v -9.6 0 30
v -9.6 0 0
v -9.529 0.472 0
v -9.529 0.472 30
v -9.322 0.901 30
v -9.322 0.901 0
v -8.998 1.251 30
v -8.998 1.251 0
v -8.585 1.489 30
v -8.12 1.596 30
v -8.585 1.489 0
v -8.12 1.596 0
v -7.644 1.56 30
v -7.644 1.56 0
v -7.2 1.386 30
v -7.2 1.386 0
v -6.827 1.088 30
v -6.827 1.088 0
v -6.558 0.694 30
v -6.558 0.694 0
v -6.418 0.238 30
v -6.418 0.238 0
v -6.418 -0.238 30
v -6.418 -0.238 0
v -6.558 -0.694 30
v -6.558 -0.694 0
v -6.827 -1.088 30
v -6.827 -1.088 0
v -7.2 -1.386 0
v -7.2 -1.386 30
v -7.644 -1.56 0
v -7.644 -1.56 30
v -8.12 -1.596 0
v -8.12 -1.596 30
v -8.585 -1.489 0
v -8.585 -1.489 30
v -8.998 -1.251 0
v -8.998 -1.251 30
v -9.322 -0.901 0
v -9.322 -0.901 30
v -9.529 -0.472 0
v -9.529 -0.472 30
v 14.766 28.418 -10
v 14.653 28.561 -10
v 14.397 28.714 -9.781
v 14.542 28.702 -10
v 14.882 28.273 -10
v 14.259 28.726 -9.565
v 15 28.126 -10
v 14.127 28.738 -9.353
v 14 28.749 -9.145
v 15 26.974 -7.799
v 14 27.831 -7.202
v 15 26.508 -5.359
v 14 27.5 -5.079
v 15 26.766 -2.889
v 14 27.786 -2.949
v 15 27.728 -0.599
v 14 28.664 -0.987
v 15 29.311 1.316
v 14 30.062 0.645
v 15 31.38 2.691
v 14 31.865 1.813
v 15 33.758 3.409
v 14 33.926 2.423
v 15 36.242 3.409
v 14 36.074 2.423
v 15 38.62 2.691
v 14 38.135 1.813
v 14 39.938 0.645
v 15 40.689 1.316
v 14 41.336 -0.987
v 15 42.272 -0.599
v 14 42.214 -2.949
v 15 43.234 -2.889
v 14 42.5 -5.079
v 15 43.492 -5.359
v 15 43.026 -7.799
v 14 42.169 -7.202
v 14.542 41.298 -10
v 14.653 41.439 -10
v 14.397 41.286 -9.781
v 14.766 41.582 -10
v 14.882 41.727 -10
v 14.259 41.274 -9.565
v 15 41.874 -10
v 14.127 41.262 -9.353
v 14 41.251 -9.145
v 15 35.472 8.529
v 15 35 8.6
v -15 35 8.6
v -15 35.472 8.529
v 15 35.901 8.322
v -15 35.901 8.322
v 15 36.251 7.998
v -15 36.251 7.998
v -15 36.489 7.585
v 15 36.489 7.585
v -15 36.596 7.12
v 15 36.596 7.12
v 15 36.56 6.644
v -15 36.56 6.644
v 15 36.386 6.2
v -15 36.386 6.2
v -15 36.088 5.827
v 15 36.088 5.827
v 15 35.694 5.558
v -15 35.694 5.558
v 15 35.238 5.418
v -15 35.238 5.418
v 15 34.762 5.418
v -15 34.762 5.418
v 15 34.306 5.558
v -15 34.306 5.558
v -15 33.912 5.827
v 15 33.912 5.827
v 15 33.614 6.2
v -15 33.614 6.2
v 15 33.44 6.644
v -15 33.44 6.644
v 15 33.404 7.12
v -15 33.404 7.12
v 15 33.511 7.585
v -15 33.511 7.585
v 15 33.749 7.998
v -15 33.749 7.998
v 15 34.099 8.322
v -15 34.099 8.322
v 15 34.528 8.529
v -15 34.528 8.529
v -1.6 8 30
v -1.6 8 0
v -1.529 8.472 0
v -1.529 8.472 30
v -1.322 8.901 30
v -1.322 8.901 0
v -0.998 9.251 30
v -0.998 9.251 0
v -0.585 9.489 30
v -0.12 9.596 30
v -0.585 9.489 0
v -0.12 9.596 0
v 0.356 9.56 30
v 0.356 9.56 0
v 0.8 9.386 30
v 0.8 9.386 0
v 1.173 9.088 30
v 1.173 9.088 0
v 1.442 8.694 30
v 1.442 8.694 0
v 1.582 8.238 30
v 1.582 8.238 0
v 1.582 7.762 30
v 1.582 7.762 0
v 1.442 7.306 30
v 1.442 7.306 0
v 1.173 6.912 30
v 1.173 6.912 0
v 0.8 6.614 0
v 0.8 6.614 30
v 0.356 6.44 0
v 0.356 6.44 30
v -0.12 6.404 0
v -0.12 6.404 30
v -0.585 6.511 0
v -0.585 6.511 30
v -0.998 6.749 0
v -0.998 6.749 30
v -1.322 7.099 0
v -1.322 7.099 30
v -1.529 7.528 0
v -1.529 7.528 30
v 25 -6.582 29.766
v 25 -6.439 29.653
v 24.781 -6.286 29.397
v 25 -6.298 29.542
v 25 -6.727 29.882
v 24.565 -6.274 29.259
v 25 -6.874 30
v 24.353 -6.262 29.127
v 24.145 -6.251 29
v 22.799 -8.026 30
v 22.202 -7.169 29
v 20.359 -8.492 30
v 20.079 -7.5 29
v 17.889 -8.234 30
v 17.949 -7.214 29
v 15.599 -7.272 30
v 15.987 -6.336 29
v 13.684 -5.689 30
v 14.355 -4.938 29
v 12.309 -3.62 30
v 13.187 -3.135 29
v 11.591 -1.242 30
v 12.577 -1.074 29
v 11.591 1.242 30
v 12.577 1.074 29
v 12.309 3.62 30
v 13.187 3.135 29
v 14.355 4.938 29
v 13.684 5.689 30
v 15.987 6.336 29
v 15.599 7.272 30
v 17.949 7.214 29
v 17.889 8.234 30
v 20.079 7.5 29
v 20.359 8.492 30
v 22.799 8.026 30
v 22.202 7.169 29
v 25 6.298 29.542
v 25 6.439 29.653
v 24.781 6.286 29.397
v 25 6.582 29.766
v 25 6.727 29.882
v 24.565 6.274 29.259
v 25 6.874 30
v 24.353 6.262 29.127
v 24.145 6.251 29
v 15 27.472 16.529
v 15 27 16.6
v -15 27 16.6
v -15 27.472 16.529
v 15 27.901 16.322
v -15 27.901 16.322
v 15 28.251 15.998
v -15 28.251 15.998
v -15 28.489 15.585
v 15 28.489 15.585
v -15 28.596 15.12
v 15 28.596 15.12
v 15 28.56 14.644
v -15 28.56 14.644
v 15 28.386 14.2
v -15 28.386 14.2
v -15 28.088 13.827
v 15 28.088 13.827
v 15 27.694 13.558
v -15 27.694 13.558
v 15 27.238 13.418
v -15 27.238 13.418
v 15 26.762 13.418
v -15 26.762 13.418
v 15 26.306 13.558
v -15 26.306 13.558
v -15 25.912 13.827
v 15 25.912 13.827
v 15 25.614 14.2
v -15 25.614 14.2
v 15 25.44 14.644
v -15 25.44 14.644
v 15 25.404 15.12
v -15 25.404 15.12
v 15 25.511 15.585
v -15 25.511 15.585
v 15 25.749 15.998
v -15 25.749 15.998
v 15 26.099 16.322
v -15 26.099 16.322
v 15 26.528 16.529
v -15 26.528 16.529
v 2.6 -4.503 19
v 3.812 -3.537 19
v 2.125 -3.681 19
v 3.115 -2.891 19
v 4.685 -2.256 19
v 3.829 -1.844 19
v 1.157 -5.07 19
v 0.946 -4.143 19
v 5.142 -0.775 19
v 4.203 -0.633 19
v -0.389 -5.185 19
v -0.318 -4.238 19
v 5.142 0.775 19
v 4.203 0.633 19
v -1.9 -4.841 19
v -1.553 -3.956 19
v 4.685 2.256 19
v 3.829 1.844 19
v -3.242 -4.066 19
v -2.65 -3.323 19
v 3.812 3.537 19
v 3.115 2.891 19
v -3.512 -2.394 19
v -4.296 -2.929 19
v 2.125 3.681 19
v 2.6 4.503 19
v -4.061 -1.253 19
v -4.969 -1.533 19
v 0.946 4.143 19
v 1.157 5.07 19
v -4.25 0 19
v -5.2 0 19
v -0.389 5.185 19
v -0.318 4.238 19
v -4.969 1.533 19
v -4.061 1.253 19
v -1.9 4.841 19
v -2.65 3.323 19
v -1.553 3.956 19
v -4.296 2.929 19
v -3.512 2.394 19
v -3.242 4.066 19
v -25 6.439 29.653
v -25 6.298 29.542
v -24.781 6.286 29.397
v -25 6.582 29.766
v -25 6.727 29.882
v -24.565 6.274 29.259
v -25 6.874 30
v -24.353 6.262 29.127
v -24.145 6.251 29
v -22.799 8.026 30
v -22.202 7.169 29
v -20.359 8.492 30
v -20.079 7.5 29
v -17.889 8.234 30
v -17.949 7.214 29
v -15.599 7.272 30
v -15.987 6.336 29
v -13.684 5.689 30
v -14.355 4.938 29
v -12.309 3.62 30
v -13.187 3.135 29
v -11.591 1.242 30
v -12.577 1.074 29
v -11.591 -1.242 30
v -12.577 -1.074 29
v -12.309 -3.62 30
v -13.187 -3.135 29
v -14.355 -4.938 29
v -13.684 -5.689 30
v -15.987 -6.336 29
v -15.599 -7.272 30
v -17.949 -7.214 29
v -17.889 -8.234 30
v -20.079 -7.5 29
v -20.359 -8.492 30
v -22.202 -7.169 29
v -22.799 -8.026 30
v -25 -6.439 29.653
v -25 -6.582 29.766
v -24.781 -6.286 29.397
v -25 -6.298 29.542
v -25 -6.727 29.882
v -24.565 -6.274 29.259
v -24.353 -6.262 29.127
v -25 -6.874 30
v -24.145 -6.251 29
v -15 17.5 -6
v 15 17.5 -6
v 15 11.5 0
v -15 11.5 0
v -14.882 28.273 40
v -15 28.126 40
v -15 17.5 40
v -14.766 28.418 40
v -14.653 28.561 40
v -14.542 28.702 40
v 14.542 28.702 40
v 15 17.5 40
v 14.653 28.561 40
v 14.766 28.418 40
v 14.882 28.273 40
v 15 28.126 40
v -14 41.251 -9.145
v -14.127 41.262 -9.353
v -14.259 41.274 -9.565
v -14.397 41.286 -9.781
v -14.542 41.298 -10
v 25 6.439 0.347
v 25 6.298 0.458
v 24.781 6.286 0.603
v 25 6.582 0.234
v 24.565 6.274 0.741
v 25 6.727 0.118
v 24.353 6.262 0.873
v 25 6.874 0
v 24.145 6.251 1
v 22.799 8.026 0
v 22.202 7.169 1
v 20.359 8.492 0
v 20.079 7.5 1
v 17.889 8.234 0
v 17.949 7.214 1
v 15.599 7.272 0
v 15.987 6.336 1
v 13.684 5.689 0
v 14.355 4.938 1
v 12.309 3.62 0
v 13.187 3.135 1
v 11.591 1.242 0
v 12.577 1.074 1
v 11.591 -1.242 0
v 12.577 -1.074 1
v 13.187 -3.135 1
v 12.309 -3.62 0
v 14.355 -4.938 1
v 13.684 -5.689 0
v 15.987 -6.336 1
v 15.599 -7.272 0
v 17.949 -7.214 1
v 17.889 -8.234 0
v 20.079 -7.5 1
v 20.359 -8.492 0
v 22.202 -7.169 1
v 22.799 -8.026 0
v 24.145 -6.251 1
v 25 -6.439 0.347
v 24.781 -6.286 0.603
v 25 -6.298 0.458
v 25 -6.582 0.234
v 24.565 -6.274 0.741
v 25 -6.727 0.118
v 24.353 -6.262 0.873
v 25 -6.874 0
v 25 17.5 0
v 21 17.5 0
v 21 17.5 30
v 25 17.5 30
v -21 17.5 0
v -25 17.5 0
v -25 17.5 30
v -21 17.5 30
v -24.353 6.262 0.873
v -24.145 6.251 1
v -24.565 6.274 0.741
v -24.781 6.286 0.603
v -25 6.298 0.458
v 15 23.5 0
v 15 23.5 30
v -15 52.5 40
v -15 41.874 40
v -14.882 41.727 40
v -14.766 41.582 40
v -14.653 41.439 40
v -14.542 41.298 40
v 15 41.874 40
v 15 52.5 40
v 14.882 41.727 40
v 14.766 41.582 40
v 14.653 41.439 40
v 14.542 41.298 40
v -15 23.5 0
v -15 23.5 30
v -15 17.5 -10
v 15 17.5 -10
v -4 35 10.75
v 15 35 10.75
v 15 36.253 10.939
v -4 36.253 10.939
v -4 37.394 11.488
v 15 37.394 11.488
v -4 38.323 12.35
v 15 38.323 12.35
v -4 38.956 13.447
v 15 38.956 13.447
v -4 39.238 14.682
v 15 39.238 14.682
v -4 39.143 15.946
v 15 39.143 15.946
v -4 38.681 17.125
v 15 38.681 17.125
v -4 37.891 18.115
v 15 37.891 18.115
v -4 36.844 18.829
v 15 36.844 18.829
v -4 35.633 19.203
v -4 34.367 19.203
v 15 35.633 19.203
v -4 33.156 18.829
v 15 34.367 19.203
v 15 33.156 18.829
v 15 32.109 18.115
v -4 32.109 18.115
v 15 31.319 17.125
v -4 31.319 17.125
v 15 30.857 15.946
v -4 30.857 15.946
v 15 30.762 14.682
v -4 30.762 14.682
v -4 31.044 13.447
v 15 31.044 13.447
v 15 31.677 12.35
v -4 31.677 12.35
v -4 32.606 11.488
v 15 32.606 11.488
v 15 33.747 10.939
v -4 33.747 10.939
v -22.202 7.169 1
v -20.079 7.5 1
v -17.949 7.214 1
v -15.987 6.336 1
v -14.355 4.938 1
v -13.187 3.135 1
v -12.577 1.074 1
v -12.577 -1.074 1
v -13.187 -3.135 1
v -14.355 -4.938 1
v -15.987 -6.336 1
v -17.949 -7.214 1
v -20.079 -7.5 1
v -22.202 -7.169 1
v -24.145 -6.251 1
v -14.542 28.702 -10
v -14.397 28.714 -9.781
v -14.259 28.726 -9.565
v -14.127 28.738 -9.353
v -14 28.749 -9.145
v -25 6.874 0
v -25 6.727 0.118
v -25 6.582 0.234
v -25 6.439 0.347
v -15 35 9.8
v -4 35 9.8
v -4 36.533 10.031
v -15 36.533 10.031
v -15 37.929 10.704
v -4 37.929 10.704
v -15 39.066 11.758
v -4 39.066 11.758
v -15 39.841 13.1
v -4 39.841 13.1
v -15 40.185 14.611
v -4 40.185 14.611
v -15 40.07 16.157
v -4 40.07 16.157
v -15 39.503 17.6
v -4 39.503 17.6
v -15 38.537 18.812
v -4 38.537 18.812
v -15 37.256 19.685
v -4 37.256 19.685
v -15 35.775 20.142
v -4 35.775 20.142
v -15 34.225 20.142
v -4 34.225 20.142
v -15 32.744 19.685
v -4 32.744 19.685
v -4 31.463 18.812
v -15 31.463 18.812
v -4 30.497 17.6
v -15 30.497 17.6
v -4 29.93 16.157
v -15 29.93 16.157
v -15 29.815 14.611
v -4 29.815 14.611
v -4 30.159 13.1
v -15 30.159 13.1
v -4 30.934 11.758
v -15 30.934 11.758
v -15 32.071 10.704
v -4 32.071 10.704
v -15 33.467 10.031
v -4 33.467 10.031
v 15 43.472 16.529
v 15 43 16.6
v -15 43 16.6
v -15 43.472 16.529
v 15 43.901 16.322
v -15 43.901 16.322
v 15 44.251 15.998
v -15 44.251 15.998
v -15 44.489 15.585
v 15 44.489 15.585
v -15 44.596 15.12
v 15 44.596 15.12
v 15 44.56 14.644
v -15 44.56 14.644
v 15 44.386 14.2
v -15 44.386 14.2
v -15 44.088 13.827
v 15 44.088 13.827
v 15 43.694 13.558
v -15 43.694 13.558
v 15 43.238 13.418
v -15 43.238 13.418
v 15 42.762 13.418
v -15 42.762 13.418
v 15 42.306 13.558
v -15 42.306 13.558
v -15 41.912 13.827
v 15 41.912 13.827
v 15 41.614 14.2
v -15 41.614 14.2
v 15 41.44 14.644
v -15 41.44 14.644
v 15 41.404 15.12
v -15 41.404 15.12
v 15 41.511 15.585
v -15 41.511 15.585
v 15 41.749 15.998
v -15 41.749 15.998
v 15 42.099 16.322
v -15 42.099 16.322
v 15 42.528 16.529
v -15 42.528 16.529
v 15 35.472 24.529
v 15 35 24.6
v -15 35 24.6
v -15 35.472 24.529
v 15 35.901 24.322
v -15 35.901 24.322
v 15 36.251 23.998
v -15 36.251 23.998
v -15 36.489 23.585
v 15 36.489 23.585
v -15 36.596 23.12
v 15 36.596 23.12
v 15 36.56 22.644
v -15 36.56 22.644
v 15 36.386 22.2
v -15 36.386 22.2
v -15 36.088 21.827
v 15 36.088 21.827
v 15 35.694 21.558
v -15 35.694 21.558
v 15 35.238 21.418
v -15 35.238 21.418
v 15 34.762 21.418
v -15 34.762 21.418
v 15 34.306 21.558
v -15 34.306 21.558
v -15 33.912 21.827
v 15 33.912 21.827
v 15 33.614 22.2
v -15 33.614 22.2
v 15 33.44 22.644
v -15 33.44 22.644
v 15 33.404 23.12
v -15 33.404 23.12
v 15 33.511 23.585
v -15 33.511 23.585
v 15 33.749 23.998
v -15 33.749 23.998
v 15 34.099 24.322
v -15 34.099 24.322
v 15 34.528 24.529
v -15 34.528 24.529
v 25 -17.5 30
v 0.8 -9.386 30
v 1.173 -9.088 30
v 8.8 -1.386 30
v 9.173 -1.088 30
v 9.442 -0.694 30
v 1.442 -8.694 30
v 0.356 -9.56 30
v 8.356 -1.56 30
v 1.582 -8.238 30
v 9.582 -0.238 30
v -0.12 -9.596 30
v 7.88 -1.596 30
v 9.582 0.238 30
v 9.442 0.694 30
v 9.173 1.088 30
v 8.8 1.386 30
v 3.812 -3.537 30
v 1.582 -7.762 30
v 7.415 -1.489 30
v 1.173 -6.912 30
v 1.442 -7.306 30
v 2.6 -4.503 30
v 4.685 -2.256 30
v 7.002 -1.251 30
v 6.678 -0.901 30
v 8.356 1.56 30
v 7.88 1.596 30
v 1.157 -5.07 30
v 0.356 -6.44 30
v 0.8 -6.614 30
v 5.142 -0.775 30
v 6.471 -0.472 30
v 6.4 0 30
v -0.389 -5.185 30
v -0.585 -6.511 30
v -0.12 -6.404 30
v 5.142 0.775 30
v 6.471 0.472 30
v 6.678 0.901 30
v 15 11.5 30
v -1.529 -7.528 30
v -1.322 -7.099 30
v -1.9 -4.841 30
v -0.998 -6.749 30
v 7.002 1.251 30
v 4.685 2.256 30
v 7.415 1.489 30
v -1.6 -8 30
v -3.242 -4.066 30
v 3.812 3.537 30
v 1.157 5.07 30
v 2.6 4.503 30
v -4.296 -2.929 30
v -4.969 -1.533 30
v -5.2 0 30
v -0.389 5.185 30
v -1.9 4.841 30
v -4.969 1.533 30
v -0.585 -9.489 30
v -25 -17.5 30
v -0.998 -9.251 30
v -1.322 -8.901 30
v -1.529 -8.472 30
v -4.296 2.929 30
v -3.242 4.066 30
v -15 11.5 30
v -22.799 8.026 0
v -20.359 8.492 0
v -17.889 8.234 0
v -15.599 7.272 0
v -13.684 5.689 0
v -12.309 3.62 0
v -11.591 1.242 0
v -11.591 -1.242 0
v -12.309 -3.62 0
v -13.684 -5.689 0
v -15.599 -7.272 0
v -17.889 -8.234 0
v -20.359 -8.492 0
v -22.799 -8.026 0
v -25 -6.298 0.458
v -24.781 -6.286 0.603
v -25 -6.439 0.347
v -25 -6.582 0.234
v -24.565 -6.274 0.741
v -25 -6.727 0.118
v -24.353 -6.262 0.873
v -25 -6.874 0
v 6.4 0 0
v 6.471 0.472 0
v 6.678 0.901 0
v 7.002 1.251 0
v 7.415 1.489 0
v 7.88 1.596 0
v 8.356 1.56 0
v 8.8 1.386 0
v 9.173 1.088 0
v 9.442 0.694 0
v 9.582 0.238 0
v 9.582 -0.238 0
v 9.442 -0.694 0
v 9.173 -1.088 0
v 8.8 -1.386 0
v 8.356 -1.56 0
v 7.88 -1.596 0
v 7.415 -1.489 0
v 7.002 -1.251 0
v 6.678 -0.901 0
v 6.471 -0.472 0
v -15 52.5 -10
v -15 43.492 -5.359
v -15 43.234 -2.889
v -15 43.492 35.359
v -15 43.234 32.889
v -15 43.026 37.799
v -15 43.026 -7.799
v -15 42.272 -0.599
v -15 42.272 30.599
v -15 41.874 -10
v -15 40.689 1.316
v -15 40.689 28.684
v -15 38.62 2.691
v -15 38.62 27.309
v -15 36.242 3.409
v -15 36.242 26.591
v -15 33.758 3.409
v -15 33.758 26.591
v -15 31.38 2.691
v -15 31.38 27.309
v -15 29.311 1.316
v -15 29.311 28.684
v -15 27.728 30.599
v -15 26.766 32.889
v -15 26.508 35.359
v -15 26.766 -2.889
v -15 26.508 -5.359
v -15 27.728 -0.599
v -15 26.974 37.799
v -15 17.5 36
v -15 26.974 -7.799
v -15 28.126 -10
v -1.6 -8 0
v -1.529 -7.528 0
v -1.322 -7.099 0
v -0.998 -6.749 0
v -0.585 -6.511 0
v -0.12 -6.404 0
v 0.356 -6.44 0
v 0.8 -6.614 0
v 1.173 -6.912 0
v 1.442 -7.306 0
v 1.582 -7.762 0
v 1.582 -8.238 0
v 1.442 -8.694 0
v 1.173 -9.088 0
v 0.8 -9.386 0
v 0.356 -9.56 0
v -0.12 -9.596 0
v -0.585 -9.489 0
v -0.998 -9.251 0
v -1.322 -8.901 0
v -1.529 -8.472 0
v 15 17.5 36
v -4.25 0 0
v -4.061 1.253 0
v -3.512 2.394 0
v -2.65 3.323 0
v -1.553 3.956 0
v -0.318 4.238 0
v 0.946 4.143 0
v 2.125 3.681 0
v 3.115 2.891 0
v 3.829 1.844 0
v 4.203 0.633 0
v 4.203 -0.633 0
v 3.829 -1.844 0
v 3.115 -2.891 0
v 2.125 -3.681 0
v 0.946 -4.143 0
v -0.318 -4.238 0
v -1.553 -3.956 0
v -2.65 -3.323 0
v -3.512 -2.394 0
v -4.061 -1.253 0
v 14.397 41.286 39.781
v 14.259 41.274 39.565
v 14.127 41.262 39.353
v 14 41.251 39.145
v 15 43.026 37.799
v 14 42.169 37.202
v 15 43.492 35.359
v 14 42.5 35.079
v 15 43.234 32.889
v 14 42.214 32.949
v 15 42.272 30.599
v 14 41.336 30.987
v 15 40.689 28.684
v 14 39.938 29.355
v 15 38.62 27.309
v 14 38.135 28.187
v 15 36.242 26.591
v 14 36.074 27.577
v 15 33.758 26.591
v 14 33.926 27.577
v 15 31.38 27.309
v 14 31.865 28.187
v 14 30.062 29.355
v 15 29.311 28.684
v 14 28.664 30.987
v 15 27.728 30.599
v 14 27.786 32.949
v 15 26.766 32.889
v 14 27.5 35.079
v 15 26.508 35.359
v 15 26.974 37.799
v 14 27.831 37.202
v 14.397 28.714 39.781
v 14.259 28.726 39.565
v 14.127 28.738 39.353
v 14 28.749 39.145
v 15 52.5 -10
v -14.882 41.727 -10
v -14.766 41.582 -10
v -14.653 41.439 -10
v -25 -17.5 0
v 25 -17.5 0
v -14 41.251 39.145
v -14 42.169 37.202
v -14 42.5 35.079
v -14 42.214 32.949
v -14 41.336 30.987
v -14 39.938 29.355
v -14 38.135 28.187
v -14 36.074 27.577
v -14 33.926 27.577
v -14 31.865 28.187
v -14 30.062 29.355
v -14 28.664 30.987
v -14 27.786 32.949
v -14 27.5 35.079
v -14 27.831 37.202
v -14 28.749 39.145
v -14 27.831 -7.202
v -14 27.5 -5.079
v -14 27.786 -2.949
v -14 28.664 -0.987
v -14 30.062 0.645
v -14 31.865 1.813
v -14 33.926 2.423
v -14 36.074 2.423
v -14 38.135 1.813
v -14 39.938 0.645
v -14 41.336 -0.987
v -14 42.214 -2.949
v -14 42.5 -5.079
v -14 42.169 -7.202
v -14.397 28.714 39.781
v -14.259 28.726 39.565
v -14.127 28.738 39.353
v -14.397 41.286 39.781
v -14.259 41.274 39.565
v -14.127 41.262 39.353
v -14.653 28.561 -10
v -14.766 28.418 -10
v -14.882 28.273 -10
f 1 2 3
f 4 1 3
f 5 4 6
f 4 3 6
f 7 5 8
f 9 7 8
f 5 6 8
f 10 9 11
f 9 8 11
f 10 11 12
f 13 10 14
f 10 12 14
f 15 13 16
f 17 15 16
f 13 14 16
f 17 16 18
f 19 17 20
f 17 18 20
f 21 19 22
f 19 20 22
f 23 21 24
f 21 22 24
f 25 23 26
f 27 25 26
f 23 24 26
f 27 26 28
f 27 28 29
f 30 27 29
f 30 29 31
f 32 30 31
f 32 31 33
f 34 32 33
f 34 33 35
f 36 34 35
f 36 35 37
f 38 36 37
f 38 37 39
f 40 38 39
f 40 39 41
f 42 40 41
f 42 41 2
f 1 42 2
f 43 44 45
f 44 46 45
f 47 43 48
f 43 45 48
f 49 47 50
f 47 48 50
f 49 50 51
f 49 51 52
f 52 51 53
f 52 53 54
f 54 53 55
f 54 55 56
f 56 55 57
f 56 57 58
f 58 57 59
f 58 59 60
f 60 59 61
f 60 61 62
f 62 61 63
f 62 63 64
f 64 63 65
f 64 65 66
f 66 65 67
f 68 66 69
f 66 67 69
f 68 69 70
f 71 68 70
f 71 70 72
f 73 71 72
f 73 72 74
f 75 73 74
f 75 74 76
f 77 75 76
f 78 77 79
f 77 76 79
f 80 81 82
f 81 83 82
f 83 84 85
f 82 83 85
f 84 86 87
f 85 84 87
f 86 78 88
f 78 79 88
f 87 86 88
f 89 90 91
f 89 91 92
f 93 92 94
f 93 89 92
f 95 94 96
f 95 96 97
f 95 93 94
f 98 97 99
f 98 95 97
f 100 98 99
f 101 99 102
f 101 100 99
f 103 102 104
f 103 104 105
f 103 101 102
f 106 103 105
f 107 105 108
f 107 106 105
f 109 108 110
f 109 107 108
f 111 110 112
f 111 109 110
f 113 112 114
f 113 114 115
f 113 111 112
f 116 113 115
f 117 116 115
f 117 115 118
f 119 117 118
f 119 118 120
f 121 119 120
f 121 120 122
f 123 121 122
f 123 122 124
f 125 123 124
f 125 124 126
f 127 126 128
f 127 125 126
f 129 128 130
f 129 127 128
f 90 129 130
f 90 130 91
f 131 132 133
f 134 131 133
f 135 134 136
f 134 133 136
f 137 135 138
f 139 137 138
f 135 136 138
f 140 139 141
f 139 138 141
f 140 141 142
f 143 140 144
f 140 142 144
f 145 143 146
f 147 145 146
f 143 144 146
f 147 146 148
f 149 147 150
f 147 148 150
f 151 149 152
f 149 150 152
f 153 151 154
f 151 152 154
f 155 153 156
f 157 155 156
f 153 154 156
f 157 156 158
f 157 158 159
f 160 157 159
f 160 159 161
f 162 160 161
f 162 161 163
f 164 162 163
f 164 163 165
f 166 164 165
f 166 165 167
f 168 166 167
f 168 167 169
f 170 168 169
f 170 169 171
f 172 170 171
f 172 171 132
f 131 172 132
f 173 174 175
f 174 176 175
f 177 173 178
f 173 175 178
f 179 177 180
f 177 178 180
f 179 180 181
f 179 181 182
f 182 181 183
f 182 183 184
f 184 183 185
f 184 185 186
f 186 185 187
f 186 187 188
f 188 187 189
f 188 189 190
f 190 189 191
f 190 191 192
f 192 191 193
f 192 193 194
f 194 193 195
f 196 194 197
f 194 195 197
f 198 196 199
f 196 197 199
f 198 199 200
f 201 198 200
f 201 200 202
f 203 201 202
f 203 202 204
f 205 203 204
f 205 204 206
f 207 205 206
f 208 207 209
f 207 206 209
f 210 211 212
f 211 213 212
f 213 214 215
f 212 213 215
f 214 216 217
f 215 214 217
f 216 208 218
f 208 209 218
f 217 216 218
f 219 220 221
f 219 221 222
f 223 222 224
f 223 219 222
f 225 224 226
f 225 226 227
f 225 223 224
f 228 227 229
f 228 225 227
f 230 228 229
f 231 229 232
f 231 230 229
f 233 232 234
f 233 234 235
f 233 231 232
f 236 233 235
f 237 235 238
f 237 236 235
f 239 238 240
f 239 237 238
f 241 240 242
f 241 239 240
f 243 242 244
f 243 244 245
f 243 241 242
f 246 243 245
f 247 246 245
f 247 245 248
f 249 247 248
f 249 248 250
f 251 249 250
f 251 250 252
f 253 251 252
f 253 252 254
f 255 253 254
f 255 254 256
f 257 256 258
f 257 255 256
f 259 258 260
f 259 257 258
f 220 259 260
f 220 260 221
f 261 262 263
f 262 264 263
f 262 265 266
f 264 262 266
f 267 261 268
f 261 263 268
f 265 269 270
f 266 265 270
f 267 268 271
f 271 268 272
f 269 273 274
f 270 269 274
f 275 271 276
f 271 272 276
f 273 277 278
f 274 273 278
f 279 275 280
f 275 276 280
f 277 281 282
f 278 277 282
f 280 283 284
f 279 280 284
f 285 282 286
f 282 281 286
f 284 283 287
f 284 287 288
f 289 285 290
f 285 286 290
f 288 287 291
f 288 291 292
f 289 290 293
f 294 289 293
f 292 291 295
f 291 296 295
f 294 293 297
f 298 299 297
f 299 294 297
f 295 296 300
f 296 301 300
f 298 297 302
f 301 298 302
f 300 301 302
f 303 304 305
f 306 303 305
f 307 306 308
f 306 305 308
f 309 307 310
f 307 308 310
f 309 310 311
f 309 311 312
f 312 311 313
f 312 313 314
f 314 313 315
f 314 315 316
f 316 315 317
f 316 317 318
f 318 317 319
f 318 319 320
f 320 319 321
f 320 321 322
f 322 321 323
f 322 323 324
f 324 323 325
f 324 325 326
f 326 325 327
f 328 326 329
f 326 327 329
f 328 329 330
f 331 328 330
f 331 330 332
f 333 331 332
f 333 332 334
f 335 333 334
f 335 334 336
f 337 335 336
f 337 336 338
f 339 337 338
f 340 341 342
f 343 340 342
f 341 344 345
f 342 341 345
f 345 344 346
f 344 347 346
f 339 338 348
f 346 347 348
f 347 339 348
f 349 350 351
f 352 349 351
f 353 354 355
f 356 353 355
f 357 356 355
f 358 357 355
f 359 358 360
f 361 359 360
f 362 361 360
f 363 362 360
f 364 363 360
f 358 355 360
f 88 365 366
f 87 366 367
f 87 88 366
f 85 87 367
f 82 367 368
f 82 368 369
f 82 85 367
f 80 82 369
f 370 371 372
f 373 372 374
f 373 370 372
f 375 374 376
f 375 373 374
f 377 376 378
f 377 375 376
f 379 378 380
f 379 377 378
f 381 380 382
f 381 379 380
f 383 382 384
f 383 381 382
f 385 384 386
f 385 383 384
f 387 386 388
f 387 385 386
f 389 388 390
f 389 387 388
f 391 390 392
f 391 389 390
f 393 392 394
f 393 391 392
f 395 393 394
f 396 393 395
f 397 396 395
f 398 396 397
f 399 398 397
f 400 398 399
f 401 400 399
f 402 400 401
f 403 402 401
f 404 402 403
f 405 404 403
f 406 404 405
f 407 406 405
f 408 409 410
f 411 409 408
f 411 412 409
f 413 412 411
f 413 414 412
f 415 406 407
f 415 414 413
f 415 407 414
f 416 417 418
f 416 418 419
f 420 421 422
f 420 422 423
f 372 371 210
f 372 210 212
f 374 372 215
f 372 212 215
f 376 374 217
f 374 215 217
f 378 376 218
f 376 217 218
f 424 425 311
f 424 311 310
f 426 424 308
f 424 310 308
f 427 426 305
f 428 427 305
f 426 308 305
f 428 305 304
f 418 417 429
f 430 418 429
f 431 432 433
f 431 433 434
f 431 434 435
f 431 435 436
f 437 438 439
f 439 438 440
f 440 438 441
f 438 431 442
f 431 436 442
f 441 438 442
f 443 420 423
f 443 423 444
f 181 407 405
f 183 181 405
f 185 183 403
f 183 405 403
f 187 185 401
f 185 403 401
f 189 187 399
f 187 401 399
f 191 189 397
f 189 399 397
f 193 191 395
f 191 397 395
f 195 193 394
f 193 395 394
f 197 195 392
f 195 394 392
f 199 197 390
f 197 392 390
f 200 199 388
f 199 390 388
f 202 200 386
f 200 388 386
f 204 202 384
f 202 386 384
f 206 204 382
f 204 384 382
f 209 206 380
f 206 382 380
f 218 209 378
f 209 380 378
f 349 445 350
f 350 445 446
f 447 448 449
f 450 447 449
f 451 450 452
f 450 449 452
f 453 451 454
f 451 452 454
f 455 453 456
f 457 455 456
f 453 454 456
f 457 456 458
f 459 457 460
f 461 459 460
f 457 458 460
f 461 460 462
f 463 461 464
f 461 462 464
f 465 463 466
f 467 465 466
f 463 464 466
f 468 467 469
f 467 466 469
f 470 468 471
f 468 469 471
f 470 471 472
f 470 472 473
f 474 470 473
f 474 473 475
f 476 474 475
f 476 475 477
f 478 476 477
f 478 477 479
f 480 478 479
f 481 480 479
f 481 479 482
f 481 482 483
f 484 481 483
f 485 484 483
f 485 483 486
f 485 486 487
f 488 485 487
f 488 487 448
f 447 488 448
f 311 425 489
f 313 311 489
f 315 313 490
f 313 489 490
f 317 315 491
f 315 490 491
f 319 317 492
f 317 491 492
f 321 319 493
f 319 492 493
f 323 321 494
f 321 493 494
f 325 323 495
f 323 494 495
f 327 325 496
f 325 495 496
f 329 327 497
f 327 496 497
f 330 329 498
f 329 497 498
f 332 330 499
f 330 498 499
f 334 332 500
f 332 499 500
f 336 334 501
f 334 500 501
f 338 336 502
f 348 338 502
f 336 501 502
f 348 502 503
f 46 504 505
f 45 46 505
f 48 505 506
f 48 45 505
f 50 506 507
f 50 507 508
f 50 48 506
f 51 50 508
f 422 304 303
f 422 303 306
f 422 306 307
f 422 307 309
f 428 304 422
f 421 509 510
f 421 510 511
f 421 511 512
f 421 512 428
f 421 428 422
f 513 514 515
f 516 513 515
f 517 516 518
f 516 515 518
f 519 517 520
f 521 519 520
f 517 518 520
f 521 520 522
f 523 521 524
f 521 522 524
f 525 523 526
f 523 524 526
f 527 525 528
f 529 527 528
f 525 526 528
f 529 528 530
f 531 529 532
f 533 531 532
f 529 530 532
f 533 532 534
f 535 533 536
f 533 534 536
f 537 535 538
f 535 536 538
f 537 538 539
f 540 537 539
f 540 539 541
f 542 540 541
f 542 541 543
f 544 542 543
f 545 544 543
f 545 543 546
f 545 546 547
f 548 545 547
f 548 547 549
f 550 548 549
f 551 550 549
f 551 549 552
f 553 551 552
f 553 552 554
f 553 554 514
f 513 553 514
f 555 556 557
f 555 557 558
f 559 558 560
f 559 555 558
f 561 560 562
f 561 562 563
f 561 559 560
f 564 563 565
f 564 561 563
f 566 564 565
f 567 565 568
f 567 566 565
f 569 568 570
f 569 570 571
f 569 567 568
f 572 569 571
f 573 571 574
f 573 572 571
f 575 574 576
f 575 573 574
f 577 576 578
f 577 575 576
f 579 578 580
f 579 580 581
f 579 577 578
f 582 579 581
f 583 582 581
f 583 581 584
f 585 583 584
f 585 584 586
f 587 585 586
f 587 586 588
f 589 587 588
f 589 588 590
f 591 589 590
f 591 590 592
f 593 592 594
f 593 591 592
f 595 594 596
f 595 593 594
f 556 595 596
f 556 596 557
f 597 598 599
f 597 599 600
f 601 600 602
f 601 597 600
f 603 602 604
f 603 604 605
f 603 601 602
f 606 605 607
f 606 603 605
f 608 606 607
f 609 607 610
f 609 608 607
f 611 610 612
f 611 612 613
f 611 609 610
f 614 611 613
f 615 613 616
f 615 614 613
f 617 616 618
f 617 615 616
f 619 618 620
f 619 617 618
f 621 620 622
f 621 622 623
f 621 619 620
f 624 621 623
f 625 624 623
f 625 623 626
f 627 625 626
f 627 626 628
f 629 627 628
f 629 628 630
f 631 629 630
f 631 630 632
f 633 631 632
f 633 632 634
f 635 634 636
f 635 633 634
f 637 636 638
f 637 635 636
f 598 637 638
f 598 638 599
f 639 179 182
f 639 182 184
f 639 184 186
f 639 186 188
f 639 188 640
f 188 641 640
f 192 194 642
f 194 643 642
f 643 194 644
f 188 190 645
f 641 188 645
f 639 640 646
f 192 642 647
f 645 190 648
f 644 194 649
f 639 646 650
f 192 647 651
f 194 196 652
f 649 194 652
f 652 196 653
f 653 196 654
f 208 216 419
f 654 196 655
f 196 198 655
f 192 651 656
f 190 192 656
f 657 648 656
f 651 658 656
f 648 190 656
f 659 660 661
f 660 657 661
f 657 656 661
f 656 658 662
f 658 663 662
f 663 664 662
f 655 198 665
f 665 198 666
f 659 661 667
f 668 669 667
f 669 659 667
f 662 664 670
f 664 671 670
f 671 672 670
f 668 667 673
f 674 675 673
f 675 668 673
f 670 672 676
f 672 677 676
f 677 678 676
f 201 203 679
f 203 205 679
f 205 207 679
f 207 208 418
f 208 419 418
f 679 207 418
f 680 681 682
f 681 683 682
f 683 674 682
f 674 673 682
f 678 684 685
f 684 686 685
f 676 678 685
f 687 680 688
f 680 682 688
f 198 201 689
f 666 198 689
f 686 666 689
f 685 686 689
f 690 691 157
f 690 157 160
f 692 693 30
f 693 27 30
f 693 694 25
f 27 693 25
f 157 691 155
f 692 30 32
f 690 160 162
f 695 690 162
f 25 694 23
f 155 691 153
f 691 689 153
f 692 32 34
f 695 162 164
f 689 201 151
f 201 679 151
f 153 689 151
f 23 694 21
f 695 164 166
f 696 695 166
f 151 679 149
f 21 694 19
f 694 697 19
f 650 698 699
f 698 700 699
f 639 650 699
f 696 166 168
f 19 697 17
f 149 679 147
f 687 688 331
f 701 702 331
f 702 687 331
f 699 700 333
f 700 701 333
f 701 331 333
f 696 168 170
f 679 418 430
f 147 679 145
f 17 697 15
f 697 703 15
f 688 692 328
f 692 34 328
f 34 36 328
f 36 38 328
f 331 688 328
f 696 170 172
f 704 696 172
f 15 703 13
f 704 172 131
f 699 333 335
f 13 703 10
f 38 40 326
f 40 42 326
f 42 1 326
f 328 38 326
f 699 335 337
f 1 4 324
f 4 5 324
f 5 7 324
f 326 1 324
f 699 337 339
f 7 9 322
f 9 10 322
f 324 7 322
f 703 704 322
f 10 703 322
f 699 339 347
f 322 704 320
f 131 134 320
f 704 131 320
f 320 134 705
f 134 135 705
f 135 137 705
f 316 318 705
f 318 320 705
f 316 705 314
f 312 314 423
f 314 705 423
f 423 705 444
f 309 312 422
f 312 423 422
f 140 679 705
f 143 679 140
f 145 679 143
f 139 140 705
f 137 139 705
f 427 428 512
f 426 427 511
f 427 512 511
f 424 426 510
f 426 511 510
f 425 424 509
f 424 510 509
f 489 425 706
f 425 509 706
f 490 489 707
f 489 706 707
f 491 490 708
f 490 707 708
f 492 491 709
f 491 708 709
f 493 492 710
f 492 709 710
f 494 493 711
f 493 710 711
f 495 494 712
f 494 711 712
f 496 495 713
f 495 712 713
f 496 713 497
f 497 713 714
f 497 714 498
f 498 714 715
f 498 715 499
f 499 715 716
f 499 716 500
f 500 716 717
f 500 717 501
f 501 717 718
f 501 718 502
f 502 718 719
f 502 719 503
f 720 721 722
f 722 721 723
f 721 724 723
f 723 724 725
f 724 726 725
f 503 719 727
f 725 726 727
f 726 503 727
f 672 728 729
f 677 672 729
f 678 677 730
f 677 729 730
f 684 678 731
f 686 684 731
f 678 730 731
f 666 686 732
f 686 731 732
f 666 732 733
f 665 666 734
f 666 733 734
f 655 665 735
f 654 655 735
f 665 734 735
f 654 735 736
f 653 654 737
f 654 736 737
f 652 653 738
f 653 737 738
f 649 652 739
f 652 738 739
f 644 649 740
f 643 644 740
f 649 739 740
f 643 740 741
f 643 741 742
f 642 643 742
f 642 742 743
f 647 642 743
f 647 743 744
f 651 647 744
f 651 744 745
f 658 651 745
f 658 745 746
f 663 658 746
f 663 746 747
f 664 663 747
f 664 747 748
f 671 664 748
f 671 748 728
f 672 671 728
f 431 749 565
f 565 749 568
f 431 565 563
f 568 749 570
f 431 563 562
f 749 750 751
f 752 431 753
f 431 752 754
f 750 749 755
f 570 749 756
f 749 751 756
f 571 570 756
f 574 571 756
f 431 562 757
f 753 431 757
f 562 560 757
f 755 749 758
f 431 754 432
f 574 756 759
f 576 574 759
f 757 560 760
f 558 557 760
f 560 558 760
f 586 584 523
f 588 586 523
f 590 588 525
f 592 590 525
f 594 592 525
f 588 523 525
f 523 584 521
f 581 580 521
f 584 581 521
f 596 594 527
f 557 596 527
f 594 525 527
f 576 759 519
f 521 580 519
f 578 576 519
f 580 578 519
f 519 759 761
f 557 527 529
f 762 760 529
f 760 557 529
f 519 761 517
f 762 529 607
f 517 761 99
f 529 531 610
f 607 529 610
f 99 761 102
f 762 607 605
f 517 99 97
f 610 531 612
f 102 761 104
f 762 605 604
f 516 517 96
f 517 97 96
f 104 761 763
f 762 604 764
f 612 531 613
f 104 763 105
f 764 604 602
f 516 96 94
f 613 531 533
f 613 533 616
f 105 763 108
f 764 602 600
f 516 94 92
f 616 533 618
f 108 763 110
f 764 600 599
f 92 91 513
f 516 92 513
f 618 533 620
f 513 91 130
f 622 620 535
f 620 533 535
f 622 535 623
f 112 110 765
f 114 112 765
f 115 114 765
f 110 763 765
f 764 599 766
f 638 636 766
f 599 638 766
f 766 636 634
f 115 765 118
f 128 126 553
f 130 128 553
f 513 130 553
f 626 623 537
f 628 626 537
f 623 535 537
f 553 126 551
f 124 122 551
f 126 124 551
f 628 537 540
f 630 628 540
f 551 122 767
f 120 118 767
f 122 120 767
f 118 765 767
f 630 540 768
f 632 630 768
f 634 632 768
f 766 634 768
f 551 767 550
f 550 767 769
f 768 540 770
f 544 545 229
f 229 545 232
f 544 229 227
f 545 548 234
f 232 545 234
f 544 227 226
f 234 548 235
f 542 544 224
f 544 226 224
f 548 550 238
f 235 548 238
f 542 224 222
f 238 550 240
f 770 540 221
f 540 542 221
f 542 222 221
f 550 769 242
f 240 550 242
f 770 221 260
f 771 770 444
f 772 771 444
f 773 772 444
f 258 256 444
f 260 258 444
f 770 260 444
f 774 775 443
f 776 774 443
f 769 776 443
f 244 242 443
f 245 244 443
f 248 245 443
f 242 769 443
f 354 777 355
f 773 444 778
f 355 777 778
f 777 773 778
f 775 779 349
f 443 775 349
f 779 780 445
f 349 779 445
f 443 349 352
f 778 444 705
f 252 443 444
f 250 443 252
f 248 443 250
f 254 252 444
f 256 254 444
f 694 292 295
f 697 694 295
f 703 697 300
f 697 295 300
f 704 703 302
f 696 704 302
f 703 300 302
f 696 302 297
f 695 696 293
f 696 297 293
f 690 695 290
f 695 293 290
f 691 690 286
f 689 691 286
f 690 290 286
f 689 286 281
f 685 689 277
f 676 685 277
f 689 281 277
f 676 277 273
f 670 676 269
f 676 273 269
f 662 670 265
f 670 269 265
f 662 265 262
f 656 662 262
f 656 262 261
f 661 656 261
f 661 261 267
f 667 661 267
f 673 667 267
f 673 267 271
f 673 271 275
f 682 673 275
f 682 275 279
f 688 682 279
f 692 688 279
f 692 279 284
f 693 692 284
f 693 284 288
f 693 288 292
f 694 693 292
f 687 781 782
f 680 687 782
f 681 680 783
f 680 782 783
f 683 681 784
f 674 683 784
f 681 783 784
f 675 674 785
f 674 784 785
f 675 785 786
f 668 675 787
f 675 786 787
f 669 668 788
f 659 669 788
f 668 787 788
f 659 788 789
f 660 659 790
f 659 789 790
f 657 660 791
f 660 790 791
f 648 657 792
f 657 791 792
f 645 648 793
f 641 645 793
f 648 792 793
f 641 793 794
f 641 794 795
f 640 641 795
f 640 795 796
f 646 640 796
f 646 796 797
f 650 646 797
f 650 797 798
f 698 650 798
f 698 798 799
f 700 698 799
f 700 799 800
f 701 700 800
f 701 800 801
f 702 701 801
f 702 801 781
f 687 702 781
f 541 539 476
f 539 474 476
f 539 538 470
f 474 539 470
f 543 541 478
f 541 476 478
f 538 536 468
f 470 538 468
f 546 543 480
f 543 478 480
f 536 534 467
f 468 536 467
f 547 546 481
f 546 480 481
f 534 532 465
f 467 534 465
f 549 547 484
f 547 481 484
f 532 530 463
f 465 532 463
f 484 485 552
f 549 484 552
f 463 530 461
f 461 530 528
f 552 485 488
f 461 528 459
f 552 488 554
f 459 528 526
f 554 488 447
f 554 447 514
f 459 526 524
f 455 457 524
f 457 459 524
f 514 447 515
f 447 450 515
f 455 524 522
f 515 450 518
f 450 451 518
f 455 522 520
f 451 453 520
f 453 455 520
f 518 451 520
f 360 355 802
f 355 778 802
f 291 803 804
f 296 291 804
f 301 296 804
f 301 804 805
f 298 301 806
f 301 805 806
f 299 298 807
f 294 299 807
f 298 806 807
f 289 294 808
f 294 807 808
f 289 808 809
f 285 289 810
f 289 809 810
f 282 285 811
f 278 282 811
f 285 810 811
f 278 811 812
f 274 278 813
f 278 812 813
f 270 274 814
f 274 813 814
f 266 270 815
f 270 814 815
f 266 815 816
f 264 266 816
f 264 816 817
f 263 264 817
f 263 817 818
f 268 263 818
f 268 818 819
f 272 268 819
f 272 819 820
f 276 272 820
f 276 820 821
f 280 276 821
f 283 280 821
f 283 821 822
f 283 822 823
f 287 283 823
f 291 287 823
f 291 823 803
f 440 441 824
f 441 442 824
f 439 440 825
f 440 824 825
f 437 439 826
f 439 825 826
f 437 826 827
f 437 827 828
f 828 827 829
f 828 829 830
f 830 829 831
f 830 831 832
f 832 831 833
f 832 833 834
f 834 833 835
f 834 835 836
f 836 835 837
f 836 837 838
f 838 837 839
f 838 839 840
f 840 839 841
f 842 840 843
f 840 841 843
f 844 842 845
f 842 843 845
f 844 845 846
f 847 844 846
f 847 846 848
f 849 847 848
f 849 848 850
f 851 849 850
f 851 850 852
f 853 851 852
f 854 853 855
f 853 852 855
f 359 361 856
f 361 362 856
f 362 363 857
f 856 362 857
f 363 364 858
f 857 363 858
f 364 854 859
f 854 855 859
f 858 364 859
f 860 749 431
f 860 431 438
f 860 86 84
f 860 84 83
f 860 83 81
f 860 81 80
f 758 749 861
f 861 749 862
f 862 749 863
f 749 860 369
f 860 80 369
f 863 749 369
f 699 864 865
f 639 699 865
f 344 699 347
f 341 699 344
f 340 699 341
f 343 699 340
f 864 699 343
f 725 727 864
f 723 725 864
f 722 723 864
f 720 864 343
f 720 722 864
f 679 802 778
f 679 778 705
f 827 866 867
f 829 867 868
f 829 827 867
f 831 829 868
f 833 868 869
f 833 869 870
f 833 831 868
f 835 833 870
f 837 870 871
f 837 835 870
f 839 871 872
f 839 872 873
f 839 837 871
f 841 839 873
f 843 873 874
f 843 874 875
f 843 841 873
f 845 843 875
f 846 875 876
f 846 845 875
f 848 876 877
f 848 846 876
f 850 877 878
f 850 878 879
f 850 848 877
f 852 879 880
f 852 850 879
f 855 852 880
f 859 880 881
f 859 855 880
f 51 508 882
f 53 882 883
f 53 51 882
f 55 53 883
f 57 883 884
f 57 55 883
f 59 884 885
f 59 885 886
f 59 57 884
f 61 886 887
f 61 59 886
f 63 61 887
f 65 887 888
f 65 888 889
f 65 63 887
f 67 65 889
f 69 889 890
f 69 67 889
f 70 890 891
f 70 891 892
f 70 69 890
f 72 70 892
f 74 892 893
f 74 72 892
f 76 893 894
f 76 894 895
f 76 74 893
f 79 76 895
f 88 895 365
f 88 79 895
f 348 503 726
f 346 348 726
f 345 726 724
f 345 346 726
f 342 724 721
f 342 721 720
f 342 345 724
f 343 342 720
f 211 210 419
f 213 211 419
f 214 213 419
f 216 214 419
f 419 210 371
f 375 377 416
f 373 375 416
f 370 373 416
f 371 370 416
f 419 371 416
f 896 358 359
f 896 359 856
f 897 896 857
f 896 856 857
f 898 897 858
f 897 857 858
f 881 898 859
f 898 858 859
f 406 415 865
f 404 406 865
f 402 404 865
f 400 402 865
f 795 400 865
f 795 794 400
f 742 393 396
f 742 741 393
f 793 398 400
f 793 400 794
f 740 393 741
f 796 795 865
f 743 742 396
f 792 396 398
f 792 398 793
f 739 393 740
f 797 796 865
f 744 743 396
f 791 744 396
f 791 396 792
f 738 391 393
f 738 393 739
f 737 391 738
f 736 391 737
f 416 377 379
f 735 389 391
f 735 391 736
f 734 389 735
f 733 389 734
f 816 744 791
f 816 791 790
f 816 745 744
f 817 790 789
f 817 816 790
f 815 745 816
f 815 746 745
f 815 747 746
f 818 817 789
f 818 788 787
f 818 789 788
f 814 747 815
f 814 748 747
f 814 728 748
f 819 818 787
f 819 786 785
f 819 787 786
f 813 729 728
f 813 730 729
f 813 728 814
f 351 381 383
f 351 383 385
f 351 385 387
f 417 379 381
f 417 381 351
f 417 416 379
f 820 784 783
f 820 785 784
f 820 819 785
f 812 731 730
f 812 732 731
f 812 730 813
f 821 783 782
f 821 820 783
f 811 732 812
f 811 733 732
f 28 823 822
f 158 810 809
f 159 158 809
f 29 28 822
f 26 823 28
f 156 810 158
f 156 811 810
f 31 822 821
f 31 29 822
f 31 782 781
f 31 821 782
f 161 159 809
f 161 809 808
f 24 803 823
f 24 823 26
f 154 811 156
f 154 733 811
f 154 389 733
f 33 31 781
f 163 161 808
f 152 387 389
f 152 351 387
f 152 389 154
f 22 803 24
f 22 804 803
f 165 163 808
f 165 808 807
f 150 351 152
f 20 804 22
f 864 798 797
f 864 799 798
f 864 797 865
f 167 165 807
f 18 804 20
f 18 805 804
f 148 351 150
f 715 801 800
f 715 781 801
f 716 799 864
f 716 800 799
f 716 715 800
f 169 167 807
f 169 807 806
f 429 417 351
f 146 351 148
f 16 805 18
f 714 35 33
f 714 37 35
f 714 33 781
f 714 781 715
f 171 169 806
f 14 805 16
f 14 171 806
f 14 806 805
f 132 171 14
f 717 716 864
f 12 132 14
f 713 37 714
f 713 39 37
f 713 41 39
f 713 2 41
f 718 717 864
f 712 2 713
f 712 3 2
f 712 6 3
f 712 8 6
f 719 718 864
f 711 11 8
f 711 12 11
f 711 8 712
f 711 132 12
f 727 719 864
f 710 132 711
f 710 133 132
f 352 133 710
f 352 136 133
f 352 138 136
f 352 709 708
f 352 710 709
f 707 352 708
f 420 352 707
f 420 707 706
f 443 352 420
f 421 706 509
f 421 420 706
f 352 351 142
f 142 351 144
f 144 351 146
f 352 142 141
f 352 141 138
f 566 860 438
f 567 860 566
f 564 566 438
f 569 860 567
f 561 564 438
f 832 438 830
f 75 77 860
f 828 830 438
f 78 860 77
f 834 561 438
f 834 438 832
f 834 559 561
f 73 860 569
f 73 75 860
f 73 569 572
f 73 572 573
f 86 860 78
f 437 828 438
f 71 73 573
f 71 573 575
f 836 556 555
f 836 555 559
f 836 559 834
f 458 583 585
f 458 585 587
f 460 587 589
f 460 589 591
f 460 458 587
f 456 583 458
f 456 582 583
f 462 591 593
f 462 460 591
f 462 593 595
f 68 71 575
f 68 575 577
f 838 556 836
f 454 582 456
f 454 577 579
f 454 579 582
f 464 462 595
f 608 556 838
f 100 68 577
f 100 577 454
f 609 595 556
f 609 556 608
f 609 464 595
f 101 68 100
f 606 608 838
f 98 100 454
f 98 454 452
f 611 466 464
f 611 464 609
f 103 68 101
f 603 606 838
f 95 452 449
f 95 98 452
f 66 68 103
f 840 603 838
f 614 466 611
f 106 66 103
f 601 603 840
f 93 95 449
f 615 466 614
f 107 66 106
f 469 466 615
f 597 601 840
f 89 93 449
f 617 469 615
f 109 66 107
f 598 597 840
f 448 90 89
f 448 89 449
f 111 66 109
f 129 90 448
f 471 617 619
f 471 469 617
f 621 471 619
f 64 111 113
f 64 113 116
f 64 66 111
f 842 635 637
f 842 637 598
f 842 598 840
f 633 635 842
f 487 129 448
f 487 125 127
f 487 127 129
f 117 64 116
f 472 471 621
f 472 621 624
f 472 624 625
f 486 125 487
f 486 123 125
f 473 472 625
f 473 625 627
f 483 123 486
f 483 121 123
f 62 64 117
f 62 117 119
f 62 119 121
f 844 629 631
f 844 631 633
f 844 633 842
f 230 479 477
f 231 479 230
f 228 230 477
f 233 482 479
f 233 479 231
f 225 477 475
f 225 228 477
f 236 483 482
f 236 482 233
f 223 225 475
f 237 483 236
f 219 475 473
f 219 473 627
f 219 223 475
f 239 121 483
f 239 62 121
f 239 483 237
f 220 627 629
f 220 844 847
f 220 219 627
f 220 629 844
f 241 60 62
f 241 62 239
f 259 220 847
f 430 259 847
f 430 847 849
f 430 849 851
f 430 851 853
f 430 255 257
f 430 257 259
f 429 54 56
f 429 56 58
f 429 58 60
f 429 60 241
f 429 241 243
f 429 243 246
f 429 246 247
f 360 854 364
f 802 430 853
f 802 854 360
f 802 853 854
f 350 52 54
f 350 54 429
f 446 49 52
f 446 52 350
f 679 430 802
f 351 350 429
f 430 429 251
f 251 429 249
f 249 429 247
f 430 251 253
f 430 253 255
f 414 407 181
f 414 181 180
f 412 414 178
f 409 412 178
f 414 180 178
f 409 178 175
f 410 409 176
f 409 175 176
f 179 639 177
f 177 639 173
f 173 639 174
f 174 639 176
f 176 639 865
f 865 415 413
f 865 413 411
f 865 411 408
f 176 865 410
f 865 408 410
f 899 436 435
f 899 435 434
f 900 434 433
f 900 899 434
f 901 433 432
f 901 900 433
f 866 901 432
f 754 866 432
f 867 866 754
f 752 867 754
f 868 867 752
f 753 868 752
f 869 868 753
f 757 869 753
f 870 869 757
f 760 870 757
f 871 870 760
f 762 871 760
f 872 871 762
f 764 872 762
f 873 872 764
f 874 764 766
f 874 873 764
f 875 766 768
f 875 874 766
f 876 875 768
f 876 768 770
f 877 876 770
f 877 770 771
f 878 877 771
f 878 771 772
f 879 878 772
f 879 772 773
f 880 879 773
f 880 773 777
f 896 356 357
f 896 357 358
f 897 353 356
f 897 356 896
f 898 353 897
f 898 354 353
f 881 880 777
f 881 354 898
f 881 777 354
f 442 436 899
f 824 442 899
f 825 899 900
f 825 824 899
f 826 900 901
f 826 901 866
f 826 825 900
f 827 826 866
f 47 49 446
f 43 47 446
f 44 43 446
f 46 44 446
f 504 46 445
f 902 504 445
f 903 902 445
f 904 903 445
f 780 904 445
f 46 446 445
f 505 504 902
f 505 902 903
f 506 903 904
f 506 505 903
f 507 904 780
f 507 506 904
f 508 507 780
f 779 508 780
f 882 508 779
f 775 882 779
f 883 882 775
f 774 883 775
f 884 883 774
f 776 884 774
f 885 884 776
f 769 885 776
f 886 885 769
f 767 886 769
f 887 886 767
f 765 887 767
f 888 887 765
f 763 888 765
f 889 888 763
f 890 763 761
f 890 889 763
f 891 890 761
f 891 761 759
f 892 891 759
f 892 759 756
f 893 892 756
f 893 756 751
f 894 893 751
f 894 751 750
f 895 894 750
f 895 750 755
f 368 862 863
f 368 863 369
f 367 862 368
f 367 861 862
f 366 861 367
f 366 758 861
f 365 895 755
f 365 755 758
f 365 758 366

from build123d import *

# Parameters (mm, degrees)
SKETCH_1_W              = 50
SKETCH_1_H              = 35
EXTRUDE_1_DEPTH         = 30
HOLE_WIZARD_360_D       = 8.5
HOLE_WIZARD_465_D       = 3.2
HOLE_WIZARD_619_D       = 15
CHAMFER_1_SIZE          = 1
CHAMFER_1_SIZE_2        = 0.708203932
SKETCH_8_W              = 15
SKETCH_8_H              = 15
EXTRUDE_2_DEPTH         = 35
HOLE_WIZARD_1775_D      = 10.4
HOLE_WIZARD_1775_DEPTH  = 11
HOLE_WIZARD_1887_D      = 10.4
HOLE_WIZARD_1887_DEPTH  = 11
HOLE_WIZARD_2064_D      = 8.5
CUT_EXTRUDE_START       = -40
CUT_EXTRUDE_1_OUTLINE_R = 1.6
CUT_EXTRUDE_1_DEPTH     = 30
CHAMFER_2_SIZE          = 1
CHAMFER_2_SIZE_2        = 0.708203933
RIB_START               = -15
RIB_8_DEPTH             = 30
RIB_10_REACH            = 72.578
SKETCH_20_WALL_W        = 151.64122351
SKETCH_20_WALL_H        = 30


with BuildPart() as part:
    # 草图1 → 凸台-拉伸1 (new body)
    with BuildSketch(Plane.XY):
        Rectangle(SKETCH_1_W, SKETCH_1_H)
    extrude(amount=EXTRUDE_1_DEPTH)

    # Hole Wizard 360 (through all)
    with Locations(Plane.XY.offset(30)):
        with Locations((0, 0)):
            Hole(HOLE_WIZARD_360_D / 2)

    # Hole Wizard 465 (through all)
    with Locations(Plane.XY.offset(30)):
        with Locations((8, 0), (0, 8), (-8, 0), (0, -8)):
            Hole(HOLE_WIZARD_465_D / 2)

    # Hole Wizard 619 (through all)
    with Locations(Plane.XY.offset(30)):
        with Locations((20, 0), (-20, 0)):
            Hole(HOLE_WIZARD_619_D / 2)

    # 倒角1
    # the kernel refuses this chamfer: 1, 0.708203932 mm, written as the material it takes off along each edge
    with BuildSketch(Plane(origin=(-20, 0, 0), x_dir=(-0.8790200859122482, 0.4767847402789059, 0), z_dir=(-0.4767847402789059, -0.8790200859122482, 0))) as chamfer_1_piece_1:
        Polygon((7.5, -CHAMFER_1_SIZE), (7.5 + CHAMFER_1_SIZE, 0), (7.5, 0), align=None)
    revolve(axis=Axis((-20, 0, 0), (0, 0, -1)), revolution_arc=303.048763938, mode=Mode.SUBTRACT)
    with BuildSketch(Plane(origin=(-20, 0, 30), x_dir=(-0.879020085912248, 0.47678474027890627, 0), z_dir=(-0.47678474027890627, -0.879020085912248, 0))) as chamfer_1_piece_2:
        Polygon((7.5 + CHAMFER_1_SIZE, 0), (7.5, CHAMFER_1_SIZE), (7.5, 0), align=None)
    revolve(axis=Axis((-20, 0, 30), (0, 0, -1)), revolution_arc=303.048763938, mode=Mode.SUBTRACT)
    with BuildSketch(Plane(origin=(20, 0, 30), x_dir=(0.879020085912248, -0.4767847402789061, 0), z_dir=(0.4767847402789061, 0.879020085912248, 0))) as chamfer_1_piece_3:
        Polygon((7.5 + CHAMFER_1_SIZE, 0), (7.5, CHAMFER_1_SIZE), (7.5, 0), align=None)
    revolve(axis=Axis((20, 0, 30), (0, 0, -1)), revolution_arc=303.048763938, mode=Mode.SUBTRACT)
    with BuildSketch(Plane(origin=(20, 0, 0), x_dir=(0.8790200859122481, 0.476784740278906, 0), z_dir=(0.476784740278906, -0.8790200859122481, 0))) as chamfer_1_piece_4:
        Polygon((7.5, CHAMFER_1_SIZE), (7.5 + CHAMFER_1_SIZE, 0), (7.5, 0), align=None)
    revolve(axis=Axis((20, 0, 0), (0, 0, 1)), revolution_arc=303.048763938, mode=Mode.SUBTRACT)
    with BuildSketch(Plane(origin=(-25, 5.590169944, 32.778051389), x_dir=(0.7914486393779661, 0.611235675682274, 0), z_dir=(0, 0, -1)), Plane(origin=(25, -5.590169944, 32.778051389), x_dir=(-0.7914486393779661, -0.611235675682274, 0), z_dir=(0, 0, -1))) as chamfer_1_piece_5:
        with BuildLine():
            Line((1.080663788, 0), (CHAMFER_1_SIZE_2 * 0.611235676113, -CHAMFER_1_SIZE_2 * 0.791448639936))
            Line((CHAMFER_1_SIZE_2 * 0.611235676113, -CHAMFER_1_SIZE_2 * 0.791448639936), (0, 0))
            ThreePointArc((0, 0), (0.555522087, -0.019473843), (1.080663788, 0))
        make_face()
    extrude(amount=35.556102778, mode=Mode.SUBTRACT)
    with BuildSketch(Plane(origin=(-25, -5.590169944, 32.778051389), x_dir=(0.7914486393779665, -0.6112356756822735, 0), z_dir=(0, 0, -1))) as chamfer_1_piece_6:
        with BuildLine():
            Line((1.080663788, 0), (CHAMFER_1_SIZE_2 * 0.611235676113, CHAMFER_1_SIZE_2 * 0.791448639936))
            Line((CHAMFER_1_SIZE_2 * 0.611235676113, CHAMFER_1_SIZE_2 * 0.791448639936), (0, 0))
            ThreePointArc((0, 0), (0.555522087, 0.019473843), (1.080663788, 0))
        make_face()
    extrude(amount=35.556102778, mode=Mode.SUBTRACT)
    with BuildSketch(Plane(origin=(25, 5.590169944, 32.778051389), x_dir=(0, 1, 0), z_dir=(0, 0, -1))) as chamfer_1_piece_7:
        with BuildLine():
            Line((CHAMFER_1_SIZE_2, 0), (0.660540261, -0.855289885))
            ThreePointArc((0.660540261, -0.855289885), (0.354967464, -0.427764092), (0, 0))
            Line((0, 0), (CHAMFER_1_SIZE_2, 0))
        make_face()
    extrude(amount=35.556102778, mode=Mode.SUBTRACT)

    # 草图8 → 凸台-拉伸2 (add)
    with BuildSketch(Plane(origin=(0, 17.5, 0), x_dir=(1, 0, 0), z_dir=(0, 1, 0))):
        Polygon((15, -30), (0, -30), (-15, -30), (-15, -40), (15, -40), align=None)
        with Locations((-7.5, -22.5)):
            Rectangle(SKETCH_8_W, SKETCH_8_H)
        with Locations((-7.5, -7.5)):
            Rectangle(SKETCH_8_W, SKETCH_8_H)
        Polygon((-15, 0), (0, 0), (15, 0), (15, 10), (-15, 10), align=None)
        with Locations((7.5, -7.5)):
            Rectangle(SKETCH_8_W, SKETCH_8_H)
        with Locations((7.5, -22.5)):
            Rectangle(SKETCH_8_W, SKETCH_8_H)
    extrude(amount=EXTRUDE_2_DEPTH)

    # Hole Wizard 1775
    with Locations(Plane.XY.offset(30)):
        with Locations((0, 0)):
            Hole(HOLE_WIZARD_1775_D / 2, depth=HOLE_WIZARD_1775_DEPTH)

    # Hole Wizard 1887
    with Locations(Plane.ZY.offset(15)):
        with Locations((15, 35)):
            Hole(HOLE_WIZARD_1887_D / 2, depth=HOLE_WIZARD_1887_DEPTH)

    # Hole Wizard 2064 (through all)
    with Locations(Plane.ZY.offset(15)):
        with Locations((15, 35)):
            Hole(HOLE_WIZARD_2064_D / 2)

    # 切除-拉伸1: read off the stored shape, not the designer's step
    # 切除-拉伸1 outline → 切除-拉伸1 (cut)
    with BuildSketch(Plane.ZY.offset(25).offset(CUT_EXTRUDE_START)):
        with Locations((23, 35)):
            Circle(CUT_EXTRUDE_1_OUTLINE_R)
        with Locations((7, 35)):
            Circle(CUT_EXTRUDE_1_OUTLINE_R)
        with Locations((15, 43)):
            Circle(CUT_EXTRUDE_1_OUTLINE_R)
        with BuildLine():
            Line((40, 29.409830056), (40, 40.590169944))
            ThreePointArc((40, 40.590169944), (27.5, 35), (40, 29.409830056))
        make_face()
        with Locations((15, 27)):
            Circle(CUT_EXTRUDE_1_OUTLINE_R)
        with BuildLine():
            Line((-10, 40.590169944), (-10, 29.409830056))
            ThreePointArc((-10, 29.409830056), (2.5, 35), (-10, 40.590169944))
        make_face()
    extrude(amount=CUT_EXTRUDE_1_DEPTH, mode=Mode.SUBTRACT)

    # 倒角2
    # the kernel refuses this chamfer: 1, 0.708203933 mm, written as the material it takes off along each edge
    with BuildSketch(Plane(origin=(-15, 35, 35), x_dir=(0, 0.4767847403128172, 0.8790200858938546), z_dir=(0, -0.8790200858938546, 0.4767847403128172))) as chamfer_2_piece_1:
        Polygon((7.5 + CHAMFER_2_SIZE, 0), (7.5, -CHAMFER_2_SIZE), (7.5, 0), align=None)
    revolve(axis=Axis((-15, 35, 35), (-1, 0, 0)), revolution_arc=303.048763934, mode=Mode.SUBTRACT)
    with BuildSketch(Plane(origin=(-15, 35, -5), x_dir=(0, -0.4767847403128172, -0.8790200858938546), z_dir=(0, 0.8790200858938546, -0.4767847403128172))) as chamfer_2_piece_2:
        Polygon((7.5 + CHAMFER_2_SIZE, 0), (7.5, -CHAMFER_2_SIZE), (7.5, 0), align=None)
    revolve(axis=Axis((-15, 35, -5), (-1, 0, 0)), revolution_arc=303.048763934, mode=Mode.SUBTRACT)
    with BuildSketch(Plane(origin=(15, 35, -5), x_dir=(0, -0.4767847403128172, -0.8790200858938546), z_dir=(0, 0.8790200858938546, -0.4767847403128172))) as chamfer_2_piece_3:
        Polygon((7.5 + CHAMFER_2_SIZE, 0), (7.5, CHAMFER_2_SIZE), (7.5, 0), align=None)
    revolve(axis=Axis((15, 35, -5), (-1, 0, 0)), revolution_arc=303.048763934, mode=Mode.SUBTRACT)
    with BuildSketch(Plane(origin=(15, 35, 35), x_dir=(0, 0.4767847403128172, 0.8790200858938546), z_dir=(0, -0.8790200858938546, 0.4767847403128172))) as chamfer_2_piece_4:
        Polygon((7.5 + CHAMFER_2_SIZE, 0), (7.5, CHAMFER_2_SIZE), (7.5, 0), align=None)
    revolve(axis=Axis((15, 35, 35), (-1, 0, 0)), revolution_arc=303.048763934, mode=Mode.SUBTRACT)
    with BuildSketch(Plane(origin=(17.778051389, 40.590169944, -10), x_dir=(0, 0.6112356756567692, 0.7914486393976635), z_dir=(-1, 0, 0))) as chamfer_2_piece_5:
        with BuildLine():
            Line((1.080663788, 0), (CHAMFER_2_SIZE_2 * 0.611235675226, CHAMFER_2_SIZE_2 * 0.79144863884))
            Line((CHAMFER_2_SIZE_2 * 0.611235675226, CHAMFER_2_SIZE_2 * 0.79144863884), (0, 0))
            ThreePointArc((0, 0), (0.555522087, 0.019473843), (1.080663788, 0))
        make_face()
    extrude(amount=35.556102778, mode=Mode.SUBTRACT)
    with BuildSketch(Plane(origin=(17.778051389, 29.409830056, -10), x_dir=(0, -1, 0), z_dir=(-1, 0, 0)), Plane(origin=(17.778051389, 40.590169944, 40), x_dir=(0, 1, 0), z_dir=(-1, 0, 0))) as chamfer_2_piece_6:
        with BuildLine():
            Line((CHAMFER_2_SIZE_2, 0), (0.660540261, 0.855289885))
            ThreePointArc((0.660540261, 0.855289885), (0.354967464, 0.427764092), (0, 0))
            Line((0, 0), (CHAMFER_2_SIZE_2, 0))
        make_face()
    extrude(amount=35.556102778, mode=Mode.SUBTRACT)
    with BuildSketch(Plane(origin=(17.778051389, 29.409830056, 40), x_dir=(0, -1, 0), z_dir=(-1, 0, 0))) as chamfer_2_piece_7:
        with BuildLine():
            Line((CHAMFER_2_SIZE_2, 0), (0.660540261, -0.855289885))
            ThreePointArc((0.660540261, -0.855289885), (0.354967464, -0.427764092), (0, 0))
            Line((0, 0), (CHAMFER_2_SIZE_2, 0))
        make_face()
    extrude(amount=35.556102778, mode=Mode.SUBTRACT)

    # 筋8: read off the stored shape, not the designer's step
    # 筋8 outline → 筋8 (add)
    with BuildSketch(Plane.XY.offset(15).offset(RIB_START)):
        Polygon((21, 17.5), (15, 23.5), (15, 17.5), align=None)
    rib_8 = extrude(amount=RIB_8_DEPTH)

    # 镜向3: 筋8 across plane
    add(rib_8.mirror(Plane.ZY))

    # 草图20 wall → 筋10 (add, up to next)
    with BuildSketch(Plane(origin=(0, 14.5, 33), x_dir=(0, -0.707106781187, -0.707106781187), z_dir=(0, -0.707106781187, 0.707106781187)), mode=Mode.PRIVATE) as rib_10_sk1:
        Rectangle(SKETCH_20_WALL_W, SKETCH_20_WALL_H)
    rib_10_tool1 = extrude(rib_10_sk1.sketch, amount=-RIB_10_REACH, mode=Mode.PRIVATE) - part.part
    rib_10 = rib_10_tool1.solids().sort_by_distance((0, 14.5, 33))[0]
    add(rib_10)

    # 镜向4: 筋10 across plane
    add(rib_10.mirror(Plane.XY.offset(15)))


solid = part.part
